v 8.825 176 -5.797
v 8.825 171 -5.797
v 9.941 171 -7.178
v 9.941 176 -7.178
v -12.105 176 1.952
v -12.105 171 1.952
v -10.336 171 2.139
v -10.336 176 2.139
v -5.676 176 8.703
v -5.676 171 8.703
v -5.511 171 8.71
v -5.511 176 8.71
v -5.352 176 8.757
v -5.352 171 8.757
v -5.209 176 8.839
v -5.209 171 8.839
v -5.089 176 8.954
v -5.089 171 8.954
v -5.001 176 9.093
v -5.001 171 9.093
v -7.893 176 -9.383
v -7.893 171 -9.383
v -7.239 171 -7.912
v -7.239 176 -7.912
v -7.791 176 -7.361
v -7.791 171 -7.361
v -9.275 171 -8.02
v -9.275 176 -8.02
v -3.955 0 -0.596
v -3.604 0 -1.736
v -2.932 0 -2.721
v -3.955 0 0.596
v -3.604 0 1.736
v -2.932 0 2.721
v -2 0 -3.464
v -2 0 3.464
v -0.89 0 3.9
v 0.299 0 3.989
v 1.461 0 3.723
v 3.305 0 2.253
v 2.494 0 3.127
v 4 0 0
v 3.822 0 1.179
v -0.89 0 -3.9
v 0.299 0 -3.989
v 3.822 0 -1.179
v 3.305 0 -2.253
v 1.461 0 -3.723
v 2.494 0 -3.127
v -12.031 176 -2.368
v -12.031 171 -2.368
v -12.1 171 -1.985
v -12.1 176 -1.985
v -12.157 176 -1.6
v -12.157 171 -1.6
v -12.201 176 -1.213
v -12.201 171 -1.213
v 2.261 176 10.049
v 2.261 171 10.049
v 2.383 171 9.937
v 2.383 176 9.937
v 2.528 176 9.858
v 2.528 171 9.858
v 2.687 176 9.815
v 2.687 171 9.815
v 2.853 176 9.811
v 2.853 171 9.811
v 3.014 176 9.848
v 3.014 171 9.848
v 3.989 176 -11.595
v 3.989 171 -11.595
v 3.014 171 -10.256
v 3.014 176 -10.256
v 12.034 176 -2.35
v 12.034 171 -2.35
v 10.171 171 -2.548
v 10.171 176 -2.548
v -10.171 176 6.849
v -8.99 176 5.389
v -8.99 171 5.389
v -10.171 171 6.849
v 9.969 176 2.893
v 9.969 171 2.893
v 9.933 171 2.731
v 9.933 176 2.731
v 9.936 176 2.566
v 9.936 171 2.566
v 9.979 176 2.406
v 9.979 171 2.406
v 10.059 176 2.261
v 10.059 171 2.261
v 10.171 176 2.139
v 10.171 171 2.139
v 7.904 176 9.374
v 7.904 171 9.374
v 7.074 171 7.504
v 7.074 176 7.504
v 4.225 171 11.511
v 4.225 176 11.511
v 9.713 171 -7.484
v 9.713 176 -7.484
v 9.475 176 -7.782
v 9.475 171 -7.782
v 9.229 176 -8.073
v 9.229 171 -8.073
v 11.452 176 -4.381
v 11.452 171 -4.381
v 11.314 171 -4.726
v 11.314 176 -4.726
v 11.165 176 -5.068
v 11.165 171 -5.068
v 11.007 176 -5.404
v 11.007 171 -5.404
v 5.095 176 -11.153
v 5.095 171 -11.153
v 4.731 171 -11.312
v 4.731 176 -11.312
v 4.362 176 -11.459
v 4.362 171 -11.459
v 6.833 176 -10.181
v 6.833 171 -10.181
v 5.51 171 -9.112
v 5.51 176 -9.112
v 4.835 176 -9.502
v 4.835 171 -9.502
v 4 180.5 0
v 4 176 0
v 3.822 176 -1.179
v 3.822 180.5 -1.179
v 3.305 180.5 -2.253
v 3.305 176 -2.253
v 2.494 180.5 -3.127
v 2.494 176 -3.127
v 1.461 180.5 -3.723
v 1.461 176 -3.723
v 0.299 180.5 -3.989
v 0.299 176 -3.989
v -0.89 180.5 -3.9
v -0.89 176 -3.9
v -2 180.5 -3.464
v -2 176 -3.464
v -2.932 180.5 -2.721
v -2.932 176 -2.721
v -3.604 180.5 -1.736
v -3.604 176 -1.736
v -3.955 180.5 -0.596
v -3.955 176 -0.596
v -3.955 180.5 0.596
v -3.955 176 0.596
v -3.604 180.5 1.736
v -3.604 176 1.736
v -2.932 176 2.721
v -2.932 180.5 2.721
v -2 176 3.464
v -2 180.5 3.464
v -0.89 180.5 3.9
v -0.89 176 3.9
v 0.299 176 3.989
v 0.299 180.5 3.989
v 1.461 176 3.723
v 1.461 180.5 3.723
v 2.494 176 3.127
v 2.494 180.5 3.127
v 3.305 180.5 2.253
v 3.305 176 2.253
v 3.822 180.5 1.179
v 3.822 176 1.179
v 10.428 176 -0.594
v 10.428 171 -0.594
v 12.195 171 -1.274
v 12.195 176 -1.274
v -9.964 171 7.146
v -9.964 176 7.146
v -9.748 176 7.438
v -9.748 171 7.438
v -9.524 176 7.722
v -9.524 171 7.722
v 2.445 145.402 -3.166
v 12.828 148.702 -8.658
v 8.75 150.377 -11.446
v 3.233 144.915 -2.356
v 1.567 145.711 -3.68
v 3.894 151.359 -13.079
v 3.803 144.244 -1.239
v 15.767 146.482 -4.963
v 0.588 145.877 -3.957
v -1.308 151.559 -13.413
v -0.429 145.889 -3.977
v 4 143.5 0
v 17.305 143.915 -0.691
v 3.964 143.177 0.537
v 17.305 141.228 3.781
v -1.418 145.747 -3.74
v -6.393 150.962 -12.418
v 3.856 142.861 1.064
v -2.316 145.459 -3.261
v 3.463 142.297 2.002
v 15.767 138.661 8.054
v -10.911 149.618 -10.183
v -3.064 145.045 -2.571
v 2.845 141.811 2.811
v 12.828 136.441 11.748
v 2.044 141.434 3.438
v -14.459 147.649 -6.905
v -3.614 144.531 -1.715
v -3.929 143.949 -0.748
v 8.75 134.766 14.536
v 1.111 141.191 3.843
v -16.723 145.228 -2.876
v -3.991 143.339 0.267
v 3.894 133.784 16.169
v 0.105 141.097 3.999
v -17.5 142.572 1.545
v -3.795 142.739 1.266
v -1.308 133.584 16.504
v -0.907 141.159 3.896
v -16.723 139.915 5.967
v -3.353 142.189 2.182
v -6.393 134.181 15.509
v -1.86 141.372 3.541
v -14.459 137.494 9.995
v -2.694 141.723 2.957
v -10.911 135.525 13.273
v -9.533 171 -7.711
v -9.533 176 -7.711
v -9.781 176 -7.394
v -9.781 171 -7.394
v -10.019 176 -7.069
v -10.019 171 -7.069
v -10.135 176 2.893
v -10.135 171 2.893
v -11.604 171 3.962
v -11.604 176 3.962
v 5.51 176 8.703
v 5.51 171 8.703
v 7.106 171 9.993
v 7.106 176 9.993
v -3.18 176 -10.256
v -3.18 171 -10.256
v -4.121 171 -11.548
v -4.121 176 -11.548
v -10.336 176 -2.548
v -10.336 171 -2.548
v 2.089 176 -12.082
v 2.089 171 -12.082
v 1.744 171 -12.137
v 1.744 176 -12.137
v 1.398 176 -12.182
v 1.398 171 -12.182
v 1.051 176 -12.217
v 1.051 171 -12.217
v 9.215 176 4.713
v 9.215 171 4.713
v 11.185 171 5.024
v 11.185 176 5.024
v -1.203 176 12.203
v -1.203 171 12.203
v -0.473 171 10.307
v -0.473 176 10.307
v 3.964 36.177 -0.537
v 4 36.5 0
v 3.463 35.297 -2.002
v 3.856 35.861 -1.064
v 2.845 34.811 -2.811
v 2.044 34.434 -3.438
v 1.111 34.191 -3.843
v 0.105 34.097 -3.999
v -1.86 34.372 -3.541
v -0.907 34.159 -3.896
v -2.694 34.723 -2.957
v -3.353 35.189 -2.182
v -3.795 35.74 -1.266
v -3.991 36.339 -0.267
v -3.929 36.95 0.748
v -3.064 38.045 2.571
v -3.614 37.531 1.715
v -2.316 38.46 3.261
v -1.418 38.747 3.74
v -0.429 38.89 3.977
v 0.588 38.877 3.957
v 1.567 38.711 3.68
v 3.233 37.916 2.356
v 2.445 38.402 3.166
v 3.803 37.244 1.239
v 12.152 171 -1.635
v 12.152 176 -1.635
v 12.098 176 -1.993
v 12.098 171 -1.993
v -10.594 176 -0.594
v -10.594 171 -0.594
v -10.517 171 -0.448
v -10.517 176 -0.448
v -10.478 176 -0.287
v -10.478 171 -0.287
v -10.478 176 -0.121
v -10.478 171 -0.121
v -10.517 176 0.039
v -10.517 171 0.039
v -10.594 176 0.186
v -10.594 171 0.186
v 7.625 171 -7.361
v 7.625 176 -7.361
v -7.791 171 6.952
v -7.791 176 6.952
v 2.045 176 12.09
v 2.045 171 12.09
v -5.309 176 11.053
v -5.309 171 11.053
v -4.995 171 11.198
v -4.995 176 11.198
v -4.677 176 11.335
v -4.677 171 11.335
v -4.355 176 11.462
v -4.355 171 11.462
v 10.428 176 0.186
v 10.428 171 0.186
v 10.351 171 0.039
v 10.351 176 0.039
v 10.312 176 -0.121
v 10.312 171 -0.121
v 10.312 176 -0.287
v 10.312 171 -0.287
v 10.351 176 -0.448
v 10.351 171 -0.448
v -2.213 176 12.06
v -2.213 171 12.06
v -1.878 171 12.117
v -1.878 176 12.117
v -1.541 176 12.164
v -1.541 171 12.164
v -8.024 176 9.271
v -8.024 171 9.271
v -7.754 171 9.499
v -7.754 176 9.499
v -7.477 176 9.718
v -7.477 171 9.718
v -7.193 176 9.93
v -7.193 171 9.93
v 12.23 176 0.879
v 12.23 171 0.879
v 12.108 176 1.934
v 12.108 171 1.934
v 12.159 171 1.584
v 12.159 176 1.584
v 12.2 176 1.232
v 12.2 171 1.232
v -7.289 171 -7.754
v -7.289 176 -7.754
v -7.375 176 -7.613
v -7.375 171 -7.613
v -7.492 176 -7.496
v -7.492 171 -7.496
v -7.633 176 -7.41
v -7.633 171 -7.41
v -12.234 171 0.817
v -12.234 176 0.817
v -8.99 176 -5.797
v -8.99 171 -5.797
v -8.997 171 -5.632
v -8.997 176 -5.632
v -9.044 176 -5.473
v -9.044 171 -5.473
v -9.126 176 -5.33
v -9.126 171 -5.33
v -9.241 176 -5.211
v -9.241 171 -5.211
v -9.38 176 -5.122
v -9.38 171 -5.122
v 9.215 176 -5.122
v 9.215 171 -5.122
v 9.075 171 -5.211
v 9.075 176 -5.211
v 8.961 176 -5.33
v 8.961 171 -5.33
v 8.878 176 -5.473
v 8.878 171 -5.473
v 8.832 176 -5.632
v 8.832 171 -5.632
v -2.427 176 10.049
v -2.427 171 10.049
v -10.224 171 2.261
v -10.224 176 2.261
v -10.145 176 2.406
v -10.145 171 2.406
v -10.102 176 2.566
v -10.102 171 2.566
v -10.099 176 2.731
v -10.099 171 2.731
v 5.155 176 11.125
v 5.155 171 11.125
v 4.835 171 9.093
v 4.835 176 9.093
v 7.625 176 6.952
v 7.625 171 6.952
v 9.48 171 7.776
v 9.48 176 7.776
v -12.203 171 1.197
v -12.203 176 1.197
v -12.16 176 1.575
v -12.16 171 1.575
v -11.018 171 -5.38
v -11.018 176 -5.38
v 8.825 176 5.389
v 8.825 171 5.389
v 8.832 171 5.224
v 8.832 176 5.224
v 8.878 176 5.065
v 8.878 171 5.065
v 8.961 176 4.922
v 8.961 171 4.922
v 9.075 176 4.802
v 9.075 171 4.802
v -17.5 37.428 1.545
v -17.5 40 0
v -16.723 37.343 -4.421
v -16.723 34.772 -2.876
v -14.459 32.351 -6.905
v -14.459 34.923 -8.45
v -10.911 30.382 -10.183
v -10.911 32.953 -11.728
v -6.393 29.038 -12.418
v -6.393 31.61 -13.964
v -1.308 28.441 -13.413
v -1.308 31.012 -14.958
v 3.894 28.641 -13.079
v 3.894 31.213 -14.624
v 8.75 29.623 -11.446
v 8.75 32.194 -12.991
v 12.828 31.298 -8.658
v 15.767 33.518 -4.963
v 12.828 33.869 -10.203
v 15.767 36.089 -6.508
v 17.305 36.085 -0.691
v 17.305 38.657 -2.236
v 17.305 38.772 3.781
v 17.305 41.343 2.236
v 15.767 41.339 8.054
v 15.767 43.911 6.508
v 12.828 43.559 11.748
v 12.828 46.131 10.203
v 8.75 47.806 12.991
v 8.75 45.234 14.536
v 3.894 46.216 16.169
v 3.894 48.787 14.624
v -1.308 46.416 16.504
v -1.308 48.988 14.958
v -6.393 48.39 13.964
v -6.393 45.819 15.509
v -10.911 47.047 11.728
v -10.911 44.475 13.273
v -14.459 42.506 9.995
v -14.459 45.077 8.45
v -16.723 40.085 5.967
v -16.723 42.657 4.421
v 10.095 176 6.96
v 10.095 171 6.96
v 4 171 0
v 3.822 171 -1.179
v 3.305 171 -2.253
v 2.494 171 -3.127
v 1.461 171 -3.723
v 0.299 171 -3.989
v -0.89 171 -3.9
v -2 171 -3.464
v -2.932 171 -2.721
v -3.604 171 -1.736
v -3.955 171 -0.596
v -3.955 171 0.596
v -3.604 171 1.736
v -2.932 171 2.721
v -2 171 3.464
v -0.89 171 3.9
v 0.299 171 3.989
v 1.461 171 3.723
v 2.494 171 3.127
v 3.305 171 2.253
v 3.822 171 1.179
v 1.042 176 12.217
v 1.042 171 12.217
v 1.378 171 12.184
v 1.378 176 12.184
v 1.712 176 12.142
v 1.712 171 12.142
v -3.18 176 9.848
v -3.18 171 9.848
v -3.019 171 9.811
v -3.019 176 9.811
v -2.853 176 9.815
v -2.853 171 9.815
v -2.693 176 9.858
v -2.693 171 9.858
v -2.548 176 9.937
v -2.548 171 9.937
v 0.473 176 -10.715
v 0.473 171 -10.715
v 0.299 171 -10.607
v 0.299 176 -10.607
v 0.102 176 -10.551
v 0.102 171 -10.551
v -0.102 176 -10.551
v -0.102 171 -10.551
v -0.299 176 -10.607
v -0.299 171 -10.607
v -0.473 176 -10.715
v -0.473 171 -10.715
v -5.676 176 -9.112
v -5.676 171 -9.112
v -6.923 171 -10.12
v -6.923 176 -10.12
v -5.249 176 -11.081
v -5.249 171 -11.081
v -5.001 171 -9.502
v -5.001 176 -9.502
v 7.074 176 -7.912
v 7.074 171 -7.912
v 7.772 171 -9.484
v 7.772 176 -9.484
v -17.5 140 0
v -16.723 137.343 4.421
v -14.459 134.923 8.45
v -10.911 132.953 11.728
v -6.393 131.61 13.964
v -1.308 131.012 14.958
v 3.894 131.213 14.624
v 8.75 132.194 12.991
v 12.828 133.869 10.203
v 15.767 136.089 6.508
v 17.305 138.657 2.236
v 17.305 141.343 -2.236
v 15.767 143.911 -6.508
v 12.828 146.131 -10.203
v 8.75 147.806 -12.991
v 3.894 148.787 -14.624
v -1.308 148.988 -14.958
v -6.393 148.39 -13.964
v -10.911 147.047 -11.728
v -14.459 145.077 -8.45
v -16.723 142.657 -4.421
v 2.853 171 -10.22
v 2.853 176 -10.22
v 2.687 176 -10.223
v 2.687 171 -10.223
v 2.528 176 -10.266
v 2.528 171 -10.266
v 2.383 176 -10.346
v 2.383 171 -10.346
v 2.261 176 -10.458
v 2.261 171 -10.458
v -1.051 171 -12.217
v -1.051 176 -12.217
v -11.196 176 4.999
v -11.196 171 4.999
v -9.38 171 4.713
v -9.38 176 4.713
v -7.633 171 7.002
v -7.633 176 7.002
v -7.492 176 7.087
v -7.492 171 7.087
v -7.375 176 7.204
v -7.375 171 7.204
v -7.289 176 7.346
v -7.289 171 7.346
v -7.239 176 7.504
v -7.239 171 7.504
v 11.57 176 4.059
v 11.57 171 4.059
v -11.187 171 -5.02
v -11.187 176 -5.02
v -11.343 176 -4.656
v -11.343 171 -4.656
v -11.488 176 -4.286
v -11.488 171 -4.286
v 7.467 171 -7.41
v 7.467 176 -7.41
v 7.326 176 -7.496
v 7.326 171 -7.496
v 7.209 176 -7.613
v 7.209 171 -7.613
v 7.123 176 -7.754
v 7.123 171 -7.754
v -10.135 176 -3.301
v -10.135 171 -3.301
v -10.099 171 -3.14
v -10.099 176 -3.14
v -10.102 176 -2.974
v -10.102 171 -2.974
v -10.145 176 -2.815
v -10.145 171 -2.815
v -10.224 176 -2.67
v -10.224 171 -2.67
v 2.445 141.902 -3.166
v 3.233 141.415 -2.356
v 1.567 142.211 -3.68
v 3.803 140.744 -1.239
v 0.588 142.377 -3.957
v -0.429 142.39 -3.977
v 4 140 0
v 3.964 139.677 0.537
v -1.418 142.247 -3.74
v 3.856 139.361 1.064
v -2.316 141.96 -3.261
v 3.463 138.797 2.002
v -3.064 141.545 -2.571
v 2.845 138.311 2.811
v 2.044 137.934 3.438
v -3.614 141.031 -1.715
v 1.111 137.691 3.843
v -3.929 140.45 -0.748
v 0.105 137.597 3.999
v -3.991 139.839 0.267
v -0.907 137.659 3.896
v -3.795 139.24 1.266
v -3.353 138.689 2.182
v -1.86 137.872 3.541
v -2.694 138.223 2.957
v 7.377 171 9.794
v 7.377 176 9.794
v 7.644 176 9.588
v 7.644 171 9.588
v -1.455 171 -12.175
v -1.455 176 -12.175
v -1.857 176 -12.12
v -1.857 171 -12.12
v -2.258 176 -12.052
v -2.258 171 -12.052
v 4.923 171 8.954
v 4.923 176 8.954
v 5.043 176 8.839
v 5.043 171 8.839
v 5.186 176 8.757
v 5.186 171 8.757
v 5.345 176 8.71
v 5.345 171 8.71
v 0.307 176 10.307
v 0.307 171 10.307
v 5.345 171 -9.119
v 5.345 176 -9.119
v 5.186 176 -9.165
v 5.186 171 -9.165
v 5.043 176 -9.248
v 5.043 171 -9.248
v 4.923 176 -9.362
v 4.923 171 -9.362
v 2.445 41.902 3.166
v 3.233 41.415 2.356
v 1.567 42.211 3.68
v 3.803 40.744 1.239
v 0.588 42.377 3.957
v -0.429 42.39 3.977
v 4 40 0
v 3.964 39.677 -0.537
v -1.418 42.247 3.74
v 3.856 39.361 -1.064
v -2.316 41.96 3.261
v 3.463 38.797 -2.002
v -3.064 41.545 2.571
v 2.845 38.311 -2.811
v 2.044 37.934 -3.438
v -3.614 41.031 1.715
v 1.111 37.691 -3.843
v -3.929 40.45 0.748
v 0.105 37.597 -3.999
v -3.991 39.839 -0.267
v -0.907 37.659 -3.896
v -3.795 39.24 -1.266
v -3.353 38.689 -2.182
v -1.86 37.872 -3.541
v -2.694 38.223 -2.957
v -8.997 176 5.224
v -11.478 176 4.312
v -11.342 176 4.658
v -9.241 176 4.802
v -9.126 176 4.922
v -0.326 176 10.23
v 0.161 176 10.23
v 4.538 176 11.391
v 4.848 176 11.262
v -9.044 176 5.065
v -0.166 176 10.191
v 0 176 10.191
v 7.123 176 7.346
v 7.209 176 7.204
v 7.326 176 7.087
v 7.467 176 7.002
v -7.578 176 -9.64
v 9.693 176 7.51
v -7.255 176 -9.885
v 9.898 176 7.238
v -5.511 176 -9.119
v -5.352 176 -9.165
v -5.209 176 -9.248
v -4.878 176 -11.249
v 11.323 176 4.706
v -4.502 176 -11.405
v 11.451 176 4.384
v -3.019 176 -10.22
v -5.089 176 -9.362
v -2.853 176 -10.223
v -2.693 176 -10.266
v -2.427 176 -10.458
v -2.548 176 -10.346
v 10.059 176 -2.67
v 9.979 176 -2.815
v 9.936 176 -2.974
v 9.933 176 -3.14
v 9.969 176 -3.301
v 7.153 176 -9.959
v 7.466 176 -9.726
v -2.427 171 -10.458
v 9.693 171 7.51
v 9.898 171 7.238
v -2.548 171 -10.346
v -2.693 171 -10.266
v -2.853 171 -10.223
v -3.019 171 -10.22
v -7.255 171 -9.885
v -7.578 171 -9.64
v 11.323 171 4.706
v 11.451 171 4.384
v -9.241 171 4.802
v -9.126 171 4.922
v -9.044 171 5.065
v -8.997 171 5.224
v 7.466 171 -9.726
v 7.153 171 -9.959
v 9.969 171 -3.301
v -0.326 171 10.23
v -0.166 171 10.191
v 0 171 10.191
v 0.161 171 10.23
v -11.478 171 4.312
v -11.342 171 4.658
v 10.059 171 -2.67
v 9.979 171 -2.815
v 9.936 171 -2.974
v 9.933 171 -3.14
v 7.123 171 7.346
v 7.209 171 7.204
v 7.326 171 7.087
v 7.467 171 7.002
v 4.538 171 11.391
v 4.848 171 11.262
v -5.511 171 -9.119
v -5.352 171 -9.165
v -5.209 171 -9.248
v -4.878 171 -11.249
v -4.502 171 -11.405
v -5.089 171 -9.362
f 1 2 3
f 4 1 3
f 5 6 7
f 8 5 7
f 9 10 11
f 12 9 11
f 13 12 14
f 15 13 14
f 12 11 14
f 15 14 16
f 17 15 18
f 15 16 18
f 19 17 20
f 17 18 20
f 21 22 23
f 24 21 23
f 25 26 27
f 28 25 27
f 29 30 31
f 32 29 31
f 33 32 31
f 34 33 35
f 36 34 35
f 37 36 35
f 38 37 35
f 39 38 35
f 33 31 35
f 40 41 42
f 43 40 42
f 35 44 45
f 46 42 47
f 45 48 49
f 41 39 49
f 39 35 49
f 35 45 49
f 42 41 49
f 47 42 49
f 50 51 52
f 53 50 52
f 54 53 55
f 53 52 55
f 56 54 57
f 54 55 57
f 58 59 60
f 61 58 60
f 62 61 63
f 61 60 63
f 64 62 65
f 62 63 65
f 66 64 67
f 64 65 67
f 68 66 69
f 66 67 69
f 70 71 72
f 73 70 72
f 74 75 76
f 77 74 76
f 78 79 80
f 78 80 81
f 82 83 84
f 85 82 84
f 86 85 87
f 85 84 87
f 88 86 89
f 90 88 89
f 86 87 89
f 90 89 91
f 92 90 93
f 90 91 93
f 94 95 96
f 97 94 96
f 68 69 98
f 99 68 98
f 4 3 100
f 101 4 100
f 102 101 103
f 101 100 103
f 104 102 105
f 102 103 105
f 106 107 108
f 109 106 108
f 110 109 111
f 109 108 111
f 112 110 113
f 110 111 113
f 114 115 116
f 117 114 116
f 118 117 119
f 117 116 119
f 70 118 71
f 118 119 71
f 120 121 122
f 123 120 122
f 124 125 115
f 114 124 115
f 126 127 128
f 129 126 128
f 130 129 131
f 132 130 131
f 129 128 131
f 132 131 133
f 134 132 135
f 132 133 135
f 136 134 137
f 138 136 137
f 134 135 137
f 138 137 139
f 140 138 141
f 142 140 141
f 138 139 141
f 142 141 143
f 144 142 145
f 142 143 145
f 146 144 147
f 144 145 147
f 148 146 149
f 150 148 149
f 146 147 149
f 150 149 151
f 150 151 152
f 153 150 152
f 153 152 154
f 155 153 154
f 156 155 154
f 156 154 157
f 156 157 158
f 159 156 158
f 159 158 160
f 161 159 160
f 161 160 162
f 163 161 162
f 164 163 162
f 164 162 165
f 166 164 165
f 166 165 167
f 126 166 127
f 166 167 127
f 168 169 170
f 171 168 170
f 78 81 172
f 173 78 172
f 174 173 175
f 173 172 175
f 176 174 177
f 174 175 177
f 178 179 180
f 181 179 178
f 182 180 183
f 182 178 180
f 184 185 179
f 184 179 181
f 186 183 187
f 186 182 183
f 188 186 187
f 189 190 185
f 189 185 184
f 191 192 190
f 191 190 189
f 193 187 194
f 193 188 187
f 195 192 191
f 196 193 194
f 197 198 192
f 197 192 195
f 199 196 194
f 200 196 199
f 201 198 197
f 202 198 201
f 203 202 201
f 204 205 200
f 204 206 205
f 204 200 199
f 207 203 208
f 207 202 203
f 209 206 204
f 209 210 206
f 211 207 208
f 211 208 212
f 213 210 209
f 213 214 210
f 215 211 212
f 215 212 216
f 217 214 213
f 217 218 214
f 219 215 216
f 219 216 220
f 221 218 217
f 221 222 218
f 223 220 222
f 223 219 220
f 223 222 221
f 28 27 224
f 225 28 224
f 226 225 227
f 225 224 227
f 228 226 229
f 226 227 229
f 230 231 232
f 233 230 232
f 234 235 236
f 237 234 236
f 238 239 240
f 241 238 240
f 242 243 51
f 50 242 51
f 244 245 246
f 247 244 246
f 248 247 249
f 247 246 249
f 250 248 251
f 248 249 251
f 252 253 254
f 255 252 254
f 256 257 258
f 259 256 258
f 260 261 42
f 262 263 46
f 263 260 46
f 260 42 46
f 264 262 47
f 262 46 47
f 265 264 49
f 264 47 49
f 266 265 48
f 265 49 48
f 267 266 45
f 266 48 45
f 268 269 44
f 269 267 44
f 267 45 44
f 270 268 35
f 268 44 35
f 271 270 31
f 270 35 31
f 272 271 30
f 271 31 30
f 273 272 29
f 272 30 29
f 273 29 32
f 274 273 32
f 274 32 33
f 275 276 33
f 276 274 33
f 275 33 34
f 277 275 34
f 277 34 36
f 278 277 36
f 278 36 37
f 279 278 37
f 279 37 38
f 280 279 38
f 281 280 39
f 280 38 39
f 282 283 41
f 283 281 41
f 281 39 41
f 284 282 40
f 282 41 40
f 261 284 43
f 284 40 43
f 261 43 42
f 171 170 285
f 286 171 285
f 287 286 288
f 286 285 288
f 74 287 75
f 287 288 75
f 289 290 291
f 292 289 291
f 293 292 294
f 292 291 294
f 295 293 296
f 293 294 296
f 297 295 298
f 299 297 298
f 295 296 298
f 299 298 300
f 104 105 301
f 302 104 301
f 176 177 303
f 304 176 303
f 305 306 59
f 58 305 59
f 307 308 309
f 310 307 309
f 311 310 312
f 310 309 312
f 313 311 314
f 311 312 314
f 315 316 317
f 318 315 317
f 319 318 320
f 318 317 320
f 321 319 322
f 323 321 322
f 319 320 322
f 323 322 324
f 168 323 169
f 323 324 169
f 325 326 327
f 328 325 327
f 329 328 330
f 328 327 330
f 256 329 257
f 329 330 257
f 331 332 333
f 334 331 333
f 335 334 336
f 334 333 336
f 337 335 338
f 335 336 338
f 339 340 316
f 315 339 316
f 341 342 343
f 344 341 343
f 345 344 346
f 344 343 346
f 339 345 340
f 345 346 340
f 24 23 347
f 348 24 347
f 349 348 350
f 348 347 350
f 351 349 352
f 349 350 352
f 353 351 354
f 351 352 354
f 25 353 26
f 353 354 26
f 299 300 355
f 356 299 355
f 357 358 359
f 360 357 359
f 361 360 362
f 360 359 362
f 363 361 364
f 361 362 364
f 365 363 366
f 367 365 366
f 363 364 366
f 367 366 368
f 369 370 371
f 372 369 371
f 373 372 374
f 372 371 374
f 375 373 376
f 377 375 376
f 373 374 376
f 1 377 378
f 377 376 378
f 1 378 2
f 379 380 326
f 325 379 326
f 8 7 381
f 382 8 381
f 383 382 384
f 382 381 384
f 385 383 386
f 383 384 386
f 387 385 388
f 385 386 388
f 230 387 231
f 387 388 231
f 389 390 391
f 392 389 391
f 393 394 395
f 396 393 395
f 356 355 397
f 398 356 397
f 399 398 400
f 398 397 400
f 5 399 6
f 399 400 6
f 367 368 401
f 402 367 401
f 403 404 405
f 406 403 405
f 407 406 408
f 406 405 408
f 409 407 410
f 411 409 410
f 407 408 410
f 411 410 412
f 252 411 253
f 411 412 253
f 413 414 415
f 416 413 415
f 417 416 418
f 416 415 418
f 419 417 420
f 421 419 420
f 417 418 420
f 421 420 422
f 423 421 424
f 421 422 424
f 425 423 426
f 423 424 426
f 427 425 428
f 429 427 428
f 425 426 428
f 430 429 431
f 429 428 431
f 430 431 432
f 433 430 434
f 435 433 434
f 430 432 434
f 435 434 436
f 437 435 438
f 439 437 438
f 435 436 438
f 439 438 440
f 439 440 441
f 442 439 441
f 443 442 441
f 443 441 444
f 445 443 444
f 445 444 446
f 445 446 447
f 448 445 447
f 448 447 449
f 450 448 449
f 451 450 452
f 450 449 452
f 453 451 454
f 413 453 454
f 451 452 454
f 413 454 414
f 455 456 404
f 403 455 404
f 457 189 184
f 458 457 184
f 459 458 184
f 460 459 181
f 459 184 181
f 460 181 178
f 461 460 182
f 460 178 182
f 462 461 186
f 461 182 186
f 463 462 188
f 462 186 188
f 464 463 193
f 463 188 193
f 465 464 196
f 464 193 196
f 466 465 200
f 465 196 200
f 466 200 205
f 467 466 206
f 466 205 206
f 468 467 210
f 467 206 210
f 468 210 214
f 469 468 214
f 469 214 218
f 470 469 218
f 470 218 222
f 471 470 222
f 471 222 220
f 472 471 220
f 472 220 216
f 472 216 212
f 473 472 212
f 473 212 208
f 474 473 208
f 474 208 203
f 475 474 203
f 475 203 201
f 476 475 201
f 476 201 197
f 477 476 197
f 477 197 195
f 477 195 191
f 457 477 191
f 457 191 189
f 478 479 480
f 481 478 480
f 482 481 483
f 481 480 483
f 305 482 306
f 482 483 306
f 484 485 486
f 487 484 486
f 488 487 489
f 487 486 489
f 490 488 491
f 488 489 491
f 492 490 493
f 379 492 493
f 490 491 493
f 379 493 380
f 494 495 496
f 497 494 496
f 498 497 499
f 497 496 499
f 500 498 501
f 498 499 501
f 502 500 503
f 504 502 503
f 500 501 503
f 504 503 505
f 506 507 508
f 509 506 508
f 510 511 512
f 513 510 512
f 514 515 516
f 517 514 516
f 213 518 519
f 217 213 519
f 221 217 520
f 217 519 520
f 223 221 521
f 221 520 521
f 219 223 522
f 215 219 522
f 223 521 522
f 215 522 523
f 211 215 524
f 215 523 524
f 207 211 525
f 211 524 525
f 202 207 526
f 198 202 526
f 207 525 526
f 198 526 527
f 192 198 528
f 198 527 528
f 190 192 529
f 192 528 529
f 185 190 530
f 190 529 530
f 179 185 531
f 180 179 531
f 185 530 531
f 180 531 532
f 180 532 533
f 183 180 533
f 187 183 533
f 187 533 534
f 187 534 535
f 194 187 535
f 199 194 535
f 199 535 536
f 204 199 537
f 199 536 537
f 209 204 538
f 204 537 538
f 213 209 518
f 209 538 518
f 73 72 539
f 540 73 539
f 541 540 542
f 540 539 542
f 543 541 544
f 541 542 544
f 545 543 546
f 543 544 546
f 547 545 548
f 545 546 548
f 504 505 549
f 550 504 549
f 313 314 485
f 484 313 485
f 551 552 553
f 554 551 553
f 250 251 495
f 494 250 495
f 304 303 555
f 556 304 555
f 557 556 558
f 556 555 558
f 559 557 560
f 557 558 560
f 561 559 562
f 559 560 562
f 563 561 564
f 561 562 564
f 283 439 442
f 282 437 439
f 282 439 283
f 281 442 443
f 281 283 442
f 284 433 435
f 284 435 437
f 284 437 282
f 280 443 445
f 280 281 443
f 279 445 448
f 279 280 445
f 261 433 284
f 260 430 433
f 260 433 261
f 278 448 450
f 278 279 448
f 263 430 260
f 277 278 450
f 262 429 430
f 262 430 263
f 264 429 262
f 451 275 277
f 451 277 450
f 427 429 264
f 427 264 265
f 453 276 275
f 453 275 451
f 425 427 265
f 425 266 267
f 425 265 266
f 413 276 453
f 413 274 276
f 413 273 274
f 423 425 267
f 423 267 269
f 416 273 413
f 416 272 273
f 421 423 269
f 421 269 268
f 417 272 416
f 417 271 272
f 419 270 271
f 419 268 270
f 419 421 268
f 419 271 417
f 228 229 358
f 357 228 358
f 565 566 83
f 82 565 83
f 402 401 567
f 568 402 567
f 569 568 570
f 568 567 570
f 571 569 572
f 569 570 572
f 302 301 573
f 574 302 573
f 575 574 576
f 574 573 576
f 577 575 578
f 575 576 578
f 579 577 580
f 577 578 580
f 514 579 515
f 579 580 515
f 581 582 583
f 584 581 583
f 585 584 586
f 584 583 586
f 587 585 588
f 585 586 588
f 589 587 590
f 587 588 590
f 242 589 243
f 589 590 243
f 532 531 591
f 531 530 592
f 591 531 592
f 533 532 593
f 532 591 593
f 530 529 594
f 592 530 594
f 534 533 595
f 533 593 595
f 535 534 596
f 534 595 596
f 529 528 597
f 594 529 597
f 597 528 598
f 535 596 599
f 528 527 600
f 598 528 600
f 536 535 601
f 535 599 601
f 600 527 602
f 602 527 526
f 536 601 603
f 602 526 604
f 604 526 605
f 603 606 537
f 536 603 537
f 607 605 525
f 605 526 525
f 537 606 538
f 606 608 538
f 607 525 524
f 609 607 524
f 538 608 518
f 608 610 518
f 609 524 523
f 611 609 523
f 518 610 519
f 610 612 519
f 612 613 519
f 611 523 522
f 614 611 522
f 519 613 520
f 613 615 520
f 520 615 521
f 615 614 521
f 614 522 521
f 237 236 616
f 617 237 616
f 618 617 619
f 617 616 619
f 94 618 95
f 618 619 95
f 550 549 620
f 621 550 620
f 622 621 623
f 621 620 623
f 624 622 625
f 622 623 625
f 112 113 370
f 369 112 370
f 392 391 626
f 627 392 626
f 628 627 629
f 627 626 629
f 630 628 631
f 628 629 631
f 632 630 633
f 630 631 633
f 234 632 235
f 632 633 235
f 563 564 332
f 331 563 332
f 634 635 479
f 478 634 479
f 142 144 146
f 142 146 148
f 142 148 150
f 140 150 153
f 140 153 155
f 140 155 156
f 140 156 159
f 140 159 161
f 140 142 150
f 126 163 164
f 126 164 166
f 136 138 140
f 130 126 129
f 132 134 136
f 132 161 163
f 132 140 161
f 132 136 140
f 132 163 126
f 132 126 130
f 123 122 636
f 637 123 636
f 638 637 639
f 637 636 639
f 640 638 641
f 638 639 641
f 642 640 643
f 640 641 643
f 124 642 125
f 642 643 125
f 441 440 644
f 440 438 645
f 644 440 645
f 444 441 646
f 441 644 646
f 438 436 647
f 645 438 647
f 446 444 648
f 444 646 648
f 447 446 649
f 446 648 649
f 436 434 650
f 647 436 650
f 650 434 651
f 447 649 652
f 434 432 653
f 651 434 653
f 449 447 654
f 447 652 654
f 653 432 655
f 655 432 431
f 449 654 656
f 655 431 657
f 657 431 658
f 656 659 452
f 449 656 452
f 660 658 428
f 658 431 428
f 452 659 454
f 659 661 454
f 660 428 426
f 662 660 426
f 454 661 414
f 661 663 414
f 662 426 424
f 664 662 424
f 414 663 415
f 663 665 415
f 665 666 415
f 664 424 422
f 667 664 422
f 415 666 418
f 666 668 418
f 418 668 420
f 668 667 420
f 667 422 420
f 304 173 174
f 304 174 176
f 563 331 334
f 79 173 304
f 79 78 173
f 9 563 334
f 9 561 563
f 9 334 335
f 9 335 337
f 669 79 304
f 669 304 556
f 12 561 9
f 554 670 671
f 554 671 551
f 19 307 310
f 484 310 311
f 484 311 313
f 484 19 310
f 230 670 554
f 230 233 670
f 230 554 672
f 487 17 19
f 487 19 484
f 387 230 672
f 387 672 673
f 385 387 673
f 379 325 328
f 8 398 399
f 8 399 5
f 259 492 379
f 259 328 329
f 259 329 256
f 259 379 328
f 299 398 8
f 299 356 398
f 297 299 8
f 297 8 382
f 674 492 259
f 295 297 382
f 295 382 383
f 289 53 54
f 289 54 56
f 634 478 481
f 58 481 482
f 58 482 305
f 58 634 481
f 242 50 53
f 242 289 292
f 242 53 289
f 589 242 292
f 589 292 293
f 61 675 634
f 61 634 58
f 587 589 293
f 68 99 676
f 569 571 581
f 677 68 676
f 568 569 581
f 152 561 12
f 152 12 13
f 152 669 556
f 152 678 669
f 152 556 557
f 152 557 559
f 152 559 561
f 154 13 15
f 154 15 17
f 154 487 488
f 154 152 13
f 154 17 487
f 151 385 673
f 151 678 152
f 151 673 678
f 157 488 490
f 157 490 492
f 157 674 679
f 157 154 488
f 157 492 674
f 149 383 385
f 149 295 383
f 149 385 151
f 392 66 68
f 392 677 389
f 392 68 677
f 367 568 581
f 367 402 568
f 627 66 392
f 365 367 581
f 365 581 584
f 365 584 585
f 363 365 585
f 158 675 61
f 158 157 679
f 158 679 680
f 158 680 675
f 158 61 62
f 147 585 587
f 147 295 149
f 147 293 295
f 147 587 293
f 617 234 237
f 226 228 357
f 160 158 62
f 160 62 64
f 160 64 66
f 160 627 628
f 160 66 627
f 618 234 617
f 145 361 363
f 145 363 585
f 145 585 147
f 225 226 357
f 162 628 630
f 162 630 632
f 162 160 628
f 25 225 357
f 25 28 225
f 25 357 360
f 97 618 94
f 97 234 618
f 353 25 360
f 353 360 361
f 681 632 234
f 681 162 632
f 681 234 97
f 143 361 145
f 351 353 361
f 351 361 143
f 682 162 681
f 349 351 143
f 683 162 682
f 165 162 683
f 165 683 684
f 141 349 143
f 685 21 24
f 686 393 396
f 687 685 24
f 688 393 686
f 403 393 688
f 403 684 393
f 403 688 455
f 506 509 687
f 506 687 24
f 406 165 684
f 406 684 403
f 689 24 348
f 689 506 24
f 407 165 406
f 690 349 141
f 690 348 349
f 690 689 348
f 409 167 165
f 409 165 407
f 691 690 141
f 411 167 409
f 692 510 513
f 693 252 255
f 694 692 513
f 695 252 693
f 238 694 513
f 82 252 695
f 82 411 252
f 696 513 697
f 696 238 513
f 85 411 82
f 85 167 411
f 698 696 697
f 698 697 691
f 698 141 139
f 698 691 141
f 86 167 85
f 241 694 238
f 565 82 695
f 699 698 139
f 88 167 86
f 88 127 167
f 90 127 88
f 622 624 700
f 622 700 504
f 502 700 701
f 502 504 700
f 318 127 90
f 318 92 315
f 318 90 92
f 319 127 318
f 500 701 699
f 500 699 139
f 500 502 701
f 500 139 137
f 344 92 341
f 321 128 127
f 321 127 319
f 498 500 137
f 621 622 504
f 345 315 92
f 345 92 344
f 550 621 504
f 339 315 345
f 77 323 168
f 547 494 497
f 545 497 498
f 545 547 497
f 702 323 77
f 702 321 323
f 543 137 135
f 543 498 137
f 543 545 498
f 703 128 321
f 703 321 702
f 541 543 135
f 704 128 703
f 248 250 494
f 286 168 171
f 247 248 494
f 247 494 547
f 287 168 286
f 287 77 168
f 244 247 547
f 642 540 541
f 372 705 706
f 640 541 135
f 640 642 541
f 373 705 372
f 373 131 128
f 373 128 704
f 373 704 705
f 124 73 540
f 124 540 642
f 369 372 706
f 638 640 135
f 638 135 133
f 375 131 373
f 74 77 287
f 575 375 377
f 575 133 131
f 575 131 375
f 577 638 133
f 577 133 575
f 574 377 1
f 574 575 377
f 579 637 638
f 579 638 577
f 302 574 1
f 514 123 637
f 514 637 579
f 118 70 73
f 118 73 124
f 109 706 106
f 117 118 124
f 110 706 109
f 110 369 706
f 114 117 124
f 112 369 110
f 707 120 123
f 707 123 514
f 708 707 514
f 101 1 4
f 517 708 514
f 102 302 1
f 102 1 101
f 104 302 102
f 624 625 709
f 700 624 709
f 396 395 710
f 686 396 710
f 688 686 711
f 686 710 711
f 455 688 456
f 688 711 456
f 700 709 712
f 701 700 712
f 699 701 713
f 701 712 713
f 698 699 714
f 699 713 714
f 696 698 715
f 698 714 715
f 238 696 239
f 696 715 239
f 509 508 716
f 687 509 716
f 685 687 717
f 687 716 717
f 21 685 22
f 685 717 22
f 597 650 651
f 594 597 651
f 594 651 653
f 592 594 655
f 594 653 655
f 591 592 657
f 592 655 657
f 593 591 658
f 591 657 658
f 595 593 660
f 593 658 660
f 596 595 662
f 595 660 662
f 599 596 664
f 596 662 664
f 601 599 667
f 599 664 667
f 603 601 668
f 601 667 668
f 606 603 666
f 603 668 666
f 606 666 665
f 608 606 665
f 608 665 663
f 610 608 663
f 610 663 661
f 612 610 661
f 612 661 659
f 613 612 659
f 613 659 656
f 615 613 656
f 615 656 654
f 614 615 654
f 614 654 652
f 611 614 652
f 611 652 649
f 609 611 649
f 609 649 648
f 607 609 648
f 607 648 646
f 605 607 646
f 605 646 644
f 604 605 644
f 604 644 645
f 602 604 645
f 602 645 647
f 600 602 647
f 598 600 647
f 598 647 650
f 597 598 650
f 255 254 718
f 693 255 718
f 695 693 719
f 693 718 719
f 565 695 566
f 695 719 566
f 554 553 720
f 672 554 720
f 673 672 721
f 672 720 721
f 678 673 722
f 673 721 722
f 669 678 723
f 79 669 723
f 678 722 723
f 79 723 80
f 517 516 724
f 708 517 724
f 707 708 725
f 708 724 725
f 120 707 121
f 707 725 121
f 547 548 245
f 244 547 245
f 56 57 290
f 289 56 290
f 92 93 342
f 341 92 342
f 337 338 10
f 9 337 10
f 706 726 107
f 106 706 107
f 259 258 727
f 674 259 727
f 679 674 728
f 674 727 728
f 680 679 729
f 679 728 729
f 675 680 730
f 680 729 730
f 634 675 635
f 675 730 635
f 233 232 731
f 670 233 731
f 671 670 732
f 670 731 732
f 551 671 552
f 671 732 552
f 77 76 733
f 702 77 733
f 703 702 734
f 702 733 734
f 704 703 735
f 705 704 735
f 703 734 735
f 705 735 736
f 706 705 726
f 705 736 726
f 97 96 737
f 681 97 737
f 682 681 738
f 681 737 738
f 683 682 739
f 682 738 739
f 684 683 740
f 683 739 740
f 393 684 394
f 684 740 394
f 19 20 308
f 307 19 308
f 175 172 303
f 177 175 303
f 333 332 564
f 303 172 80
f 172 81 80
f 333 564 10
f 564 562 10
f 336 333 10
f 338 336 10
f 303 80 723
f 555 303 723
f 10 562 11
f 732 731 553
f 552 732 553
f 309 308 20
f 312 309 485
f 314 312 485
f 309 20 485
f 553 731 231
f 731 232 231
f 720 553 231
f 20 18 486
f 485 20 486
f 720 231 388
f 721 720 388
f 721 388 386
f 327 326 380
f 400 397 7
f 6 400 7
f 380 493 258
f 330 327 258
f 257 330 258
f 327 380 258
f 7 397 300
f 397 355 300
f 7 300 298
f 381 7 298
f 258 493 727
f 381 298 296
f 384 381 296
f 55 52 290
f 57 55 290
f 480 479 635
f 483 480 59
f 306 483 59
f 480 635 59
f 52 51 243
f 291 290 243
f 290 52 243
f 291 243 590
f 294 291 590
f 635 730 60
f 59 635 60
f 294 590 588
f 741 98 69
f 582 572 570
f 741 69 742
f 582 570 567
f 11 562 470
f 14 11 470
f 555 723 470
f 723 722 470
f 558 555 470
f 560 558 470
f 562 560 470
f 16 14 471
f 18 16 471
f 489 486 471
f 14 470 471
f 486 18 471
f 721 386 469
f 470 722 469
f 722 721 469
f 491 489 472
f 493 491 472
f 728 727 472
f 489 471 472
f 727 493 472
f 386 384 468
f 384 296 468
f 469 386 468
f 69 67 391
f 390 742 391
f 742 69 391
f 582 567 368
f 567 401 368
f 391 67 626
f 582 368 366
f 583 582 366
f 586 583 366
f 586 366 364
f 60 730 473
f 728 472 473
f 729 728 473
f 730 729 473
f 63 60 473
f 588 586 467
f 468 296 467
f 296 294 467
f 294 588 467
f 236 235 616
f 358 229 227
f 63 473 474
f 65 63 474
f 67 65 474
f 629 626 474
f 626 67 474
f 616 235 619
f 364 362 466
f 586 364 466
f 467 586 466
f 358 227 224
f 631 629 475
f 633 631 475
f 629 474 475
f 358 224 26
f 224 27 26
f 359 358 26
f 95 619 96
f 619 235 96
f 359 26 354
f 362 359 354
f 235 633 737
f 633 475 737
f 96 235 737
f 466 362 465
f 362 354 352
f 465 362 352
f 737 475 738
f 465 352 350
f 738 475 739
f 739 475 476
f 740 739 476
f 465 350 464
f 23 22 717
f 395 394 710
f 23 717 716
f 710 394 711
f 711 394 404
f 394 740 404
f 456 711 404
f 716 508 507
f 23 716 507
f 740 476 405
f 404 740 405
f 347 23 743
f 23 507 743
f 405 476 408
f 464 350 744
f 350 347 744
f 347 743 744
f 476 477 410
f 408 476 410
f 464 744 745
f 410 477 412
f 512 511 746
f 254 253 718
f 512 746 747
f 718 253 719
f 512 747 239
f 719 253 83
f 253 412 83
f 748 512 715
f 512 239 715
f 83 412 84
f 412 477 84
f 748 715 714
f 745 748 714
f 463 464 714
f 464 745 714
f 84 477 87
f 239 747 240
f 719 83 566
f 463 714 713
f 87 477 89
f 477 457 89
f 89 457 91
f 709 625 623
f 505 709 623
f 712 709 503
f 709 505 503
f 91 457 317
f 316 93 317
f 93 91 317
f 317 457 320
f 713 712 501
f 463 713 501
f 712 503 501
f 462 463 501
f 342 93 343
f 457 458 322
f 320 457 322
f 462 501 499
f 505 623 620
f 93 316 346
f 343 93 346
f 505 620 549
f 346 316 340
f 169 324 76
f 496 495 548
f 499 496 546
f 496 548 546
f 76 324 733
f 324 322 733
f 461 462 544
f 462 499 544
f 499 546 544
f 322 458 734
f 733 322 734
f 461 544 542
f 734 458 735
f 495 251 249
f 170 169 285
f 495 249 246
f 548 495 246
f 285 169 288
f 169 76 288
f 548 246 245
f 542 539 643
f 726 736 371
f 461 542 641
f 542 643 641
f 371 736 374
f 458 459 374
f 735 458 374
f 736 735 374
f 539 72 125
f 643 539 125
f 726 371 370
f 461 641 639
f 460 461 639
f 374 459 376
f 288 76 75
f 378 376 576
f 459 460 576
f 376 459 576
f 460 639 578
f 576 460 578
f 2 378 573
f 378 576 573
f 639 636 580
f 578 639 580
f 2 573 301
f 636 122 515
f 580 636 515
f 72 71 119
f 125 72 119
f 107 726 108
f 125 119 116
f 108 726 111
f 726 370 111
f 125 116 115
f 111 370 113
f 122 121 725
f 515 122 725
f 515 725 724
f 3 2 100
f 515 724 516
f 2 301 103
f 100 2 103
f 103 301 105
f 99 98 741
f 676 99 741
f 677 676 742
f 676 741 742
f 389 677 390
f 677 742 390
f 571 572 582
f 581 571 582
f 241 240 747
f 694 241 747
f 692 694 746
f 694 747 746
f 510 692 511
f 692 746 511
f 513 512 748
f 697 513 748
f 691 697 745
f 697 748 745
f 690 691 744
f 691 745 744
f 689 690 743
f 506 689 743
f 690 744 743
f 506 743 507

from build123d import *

# Parameters (mm, degrees)
CROQUIS1_R              = 4
SALIENTE_EXTRUIR1_DEPTH = 171
CROQUIS2_R              = 17.5
SALIENTE_EXTRUIR2_DEPTH = 3
SALIENTE_EXTRUIR3_DEPTH = 5
CROQUIS4_R              = 4
SALIENTE_EXTRUIR4_DEPTH = 4.5
CROQUIS8_R              = 17.5
SALIENTE_EXTRUIR6_DEPTH = 3


with BuildPart() as part:
    # Croquis1 → Saliente-Extruir1 (new body)
    with BuildSketch(Plane(origin=(0, 0, 0), x_dir=(1, 0, 0), z_dir=(0, 1, 0))):
        Circle(CROQUIS1_R)
    extrude(amount=SALIENTE_EXTRUIR1_DEPTH)

    # Croquis2 → Saliente-Extruir2 (add)
    with BuildSketch(Plane(origin=(0, 29.389431256, -17.658951857), x_dir=(-1, 0, 0), z_dir=(0, -0.857167301, 0.515038075))):
        with Locations((0, -20.601522996)):
            Circle(CROQUIS2_R)
    extrude(amount=SALIENTE_EXTRUIR2_DEPTH)

    # Croquis3 → Saliente-Extruir3 (add)
    with BuildSketch(Plane(origin=(0, 171, 0), x_dir=(1, 0, 0), z_dir=(0, 1, 0))):
        with BuildLine():
            Line((1.050742858, 12.216507919), (0.472845286, 10.71499343))
            ThreePointArc((0.472845286, 10.71499343), (0, 10.543875222), (-0.472845286, 10.71499343))
            Line((-0.472845286, 10.71499343), (-1.050742858, 12.216507919))
            ThreePointArc((-1.050742858, 12.216507919), (-1.656207782, 12.14924286), (-2.257584572, 12.051988972))
            Line((-2.257584572, 12.051988972), (-2.426564451, 10.457781423))
            ThreePointArc((-2.426564451, 10.457781423), (-2.771930057, 10.239934406), (-3.179948954, 10.255912654))
            Line((-3.179948954, 10.255912654), (-4.120766374, 11.54843759))
            ThreePointArc((-4.120766374, 11.54843759), (-4.690827714, 11.328868507), (-5.249245828, 11.081179745))
            Line((-5.249245828, 11.081179745), (-5.000525386, 9.501805204))
            ThreePointArc((-5.000525386, 9.501805204), (-5.277739988, 9.201993948), (-5.675991453, 9.111824689))
            Line((-5.675991453, 9.111824689), (-6.923284582, 10.120042336))
            ThreePointArc((-6.923284582, 10.120042336), (-7.417219229, 9.763809974), (-7.892857245, 9.383492462))
            Line((-7.892857245, 9.383492462), (-7.239355878, 7.912212973))
            ThreePointArc((-7.239355878, 7.912212973), (-7.429527758, 7.55086912), (-7.790871612, 7.360697239))
            Line((-7.790871612, 7.360697239), (-9.275101788, 8.019950942))
            ThreePointArc((-9.275101788, 8.019950942), (-9.658562641, 7.553760256), (-10.018615343, 7.069262543))
            Line((-10.018615343, 7.069262543), (-8.990483327, 5.797332815))
            ThreePointArc((-8.990483327, 5.797332815), (-9.080652586, 5.39908135), (-9.380463842, 5.121866748))
            Line((-9.380463842, 5.121866748), (-11.018384727, 5.379807088))
            ThreePointArc((-11.018384727, 5.379807088), (-11.266454067, 4.838815873), (-11.487980236, 4.286424664))
            Line((-11.487980236, 4.286424664), (-10.134571292, 3.301290316))
            ThreePointArc((-10.134571292, 3.301290316), (-10.118593045, 2.893271419), (-10.336440061, 2.547905812))
            Line((-10.336440061, 2.547905812), (-12.0307187, 2.368318783))
            ThreePointArc((-12.0307187, 2.368318783), (-12.129855039, 1.792691558), (-12.201465745, 1.212996274))
            Line((-12.201465745, 1.212996274), (-10.593652069, 0.594186647))
            ThreePointArc((-10.593652069, 0.594186647), (-10.472615206, 0.204206132), (-10.593652069, -0.185774383))
            Line((-10.593652069, -0.185774383), (-12.234346993, -0.817239228))
            ThreePointArc((-12.234346993, -0.817239228), (-12.183011813, -1.386127504), (-12.105238209, -1.952007737))
            Line((-12.105238209, -1.952007737), (-10.336440061, -2.139493548))
            ThreePointArc((-10.336440061, -2.139493548), (-10.118593045, -2.484859155), (-10.134571292, -2.892878051))
            Line((-10.134571292, -2.892878051), (-11.603765461, -3.962291436))
            ThreePointArc((-11.603765461, -3.962291436), (-11.411733847, -4.485471759), (-11.196127365, -4.999385795))
            Line((-11.196127365, -4.999385795), (-9.380463842, -4.713454484))
            ThreePointArc((-9.380463842, -4.713454484), (-9.080652586, -4.990669086), (-8.990483327, -5.388920551))
            Line((-8.990483327, -5.388920551), (-10.170571543, -6.848839375))
            ThreePointArc((-10.170571543, -6.848839375), (-9.857154436, -7.29271093), (-9.524379813, -7.722261033))
            Line((-9.524379813, -7.722261033), (-7.790871612, -6.952284975))
            ThreePointArc((-7.790871612, -6.952284975), (-7.429527758, -7.142456856), (-7.239355878, -7.503800709))
            Line((-7.239355878, -7.503800709), (-8.024406446, -9.271247353))
            ThreePointArc((-8.024406446, -9.271247353), (-7.61599094, -9.60956858), (-7.193327687, -9.929912542))
            Line((-7.193327687, -9.929912542), (-5.675991453, -8.703412424))
            ThreePointArc((-5.675991453, -8.703412424), (-5.277739988, -8.793581684), (-5.000525386, -9.09339294))
            Line((-5.000525386, -9.09339294), (-5.309068741, -11.052642915))
            ThreePointArc((-5.309068741, -11.052642915), (-4.836465093, -11.26746341), (-4.355191926, -11.462086615))
            Line((-4.355191926, -11.462086615), (-3.179948954, -9.84750039))
            ThreePointArc((-3.179948954, -9.84750039), (-2.771930057, -9.831522142), (-2.426564451, -10.049369159))
            Line((-2.426564451, -10.049369159), (-2.213426541, -12.060176999))
            ThreePointArc((-2.213426541, -12.060176999), (-1.70946512, -12.141863749), (-1.202540078, -12.202500713))
            Line((-1.202540078, -12.202500713), (-0.472845286, -10.306581166))
            ThreePointArc((-0.472845286, -10.306581166), (-0.08286477, -10.185544303), (0.307115745, -10.306581166))
            Line((0.307115745, -10.306581166), (1.042474215, -12.217216287))
            ThreePointArc((1.042474215, -12.217216287), (1.544818551, -12.163908169), (2.04454079, -12.08995365))
            Line((2.04454079, -12.08995365), (2.26083491, -10.049369159))
            ThreePointArc((2.26083491, -10.049369159), (2.606200516, -9.831522142), (3.014219413, -9.84750039))
            Line((3.014219413, -9.84750039), (4.224886916, -11.510753965))
            ThreePointArc((4.224886916, -11.510753965), (4.693799885, -11.327637394), (5.154801423, -11.125428018))
            Line((5.154801423, -11.125428018), (4.834795845, -9.09339294))
            ThreePointArc((4.834795845, -9.09339294), (5.112010447, -8.793581684), (5.510261912, -8.703412424))
            Line((5.510261912, -8.703412424), (7.105542644, -9.992916993))
            ThreePointArc((7.105542644, -9.992916993), (7.511283882, -9.691632511), (7.90426552, -9.37388462))
            Line((7.90426552, -9.37388462), (7.073626337, -7.503800709))
            ThreePointArc((7.073626337, -7.503800709), (7.263798217, -7.142456856), (7.625142071, -6.952284975))
            Line((7.625142071, -6.952284975), (9.480310931, -7.776299309))
            ThreePointArc((9.480310931, -7.776299309), (9.796043302, -7.374595712), (10.094766478, -6.960087359))
            Line((10.094766478, -6.960087359), (8.824753786, -5.388920551))
            ThreePointArc((8.824753786, -5.388920551), (8.914923046, -4.990669086), (9.214734302, -4.713454484))
            Line((9.214734302, -4.713454484), (11.185209251, -5.023765551))
            ThreePointArc((11.185209251, -5.023765551), (11.388040568, -4.545289685), (11.570414703, -4.058648777))
            Line((11.570414703, -4.058648777), (9.968841751, -2.892878051))
            ThreePointArc((9.968841751, -2.892878051), (9.952863504, -2.484859155), (10.17071052, -2.139493548))
            Line((10.17071052, -2.139493548), (12.108106386, -1.934137026))
            ThreePointArc((12.108106386, -1.934137026), (12.180495026, -1.408072161), (12.230038474, -0.879366378))
            Line((12.230038474, -0.879366378), (10.427922528, -0.185774383))
            ThreePointArc((10.427922528, -0.185774383), (10.306885665, 0.204206132), (10.427922528, 0.594186647))
            Line((10.427922528, 0.594186647), (12.195208041, 1.274373229))
            ThreePointArc((12.195208041, 1.274373229), (12.12666239, 1.8141625), (12.034236318, 2.350379234))
            Line((12.034236318, 2.350379234), (10.17071052, 2.547905812))
            ThreePointArc((10.17071052, 2.547905812), (9.952863504, 2.893271419), (9.968841751, 3.301290316))
            Line((9.968841751, 3.301290316), (11.452232826, 4.381037502))
            ThreePointArc((11.452232826, 4.381037502), (11.241020253, 4.897610638), (11.006520824, 5.404037901))
            Line((11.006520824, 5.404037901), (9.214734302, 5.121866748))
            ThreePointArc((9.214734302, 5.121866748), (8.914923046, 5.39908135), (8.824753786, 5.797332815))
            Line((8.824753786, 5.797332815), (9.940895623, 7.178141856))
            ThreePointArc((9.940895623, 7.178141856), (9.595346713, 7.633901214), (9.228920544, 8.073050965))
            Line((9.228920544, 8.073050965), (7.625142071, 7.360697239))
            ThreePointArc((7.625142071, 7.360697239), (7.263798217, 7.55086912), (7.073626337, 7.912212973))
            Line((7.073626337, 7.912212973), (7.77177818, 9.48401762))
            ThreePointArc((7.77177818, 9.48401762), (7.310768329, 9.843769234), (6.83313078, 10.181132061))
            Line((6.83313078, 10.181132061), (5.510261912, 9.111824689))
            ThreePointArc((5.510261912, 9.111824689), (5.112010447, 9.201993948), (4.834795845, 9.501805204))
            Line((4.834795845, 9.501805204), (5.094829592, 11.15301922))
            ThreePointArc((5.094829592, 11.15301922), (4.547139411, 11.387302116), (3.988716959, 11.594708419))
            Line((3.988716959, 11.594708419), (3.014219413, 10.255912654))
            ThreePointArc((3.014219413, 10.255912654), (2.606200516, 10.239934406), (2.26083491, 10.457781423))
            Line((2.26083491, 10.457781423), (2.088629995, 12.082414951))
            ThreePointArc((2.088629995, 12.082414951), (1.571117662, 12.16053928), (1.050742858, 12.216507919))
        make_face()
    extrude(amount=SALIENTE_EXTRUIR3_DEPTH)

    # Croquis4 → Saliente-Extruir4 (add)
    with BuildSketch(Plane(origin=(0, 176, 0), x_dir=(1, 0, 0), z_dir=(0, 1, 0))):
        Circle(CROQUIS4_R)
    extrude(amount=SALIENTE_EXTRUIR4_DEPTH)

    # Croquis8 → Saliente-Extruir6 (add)
    with BuildSketch(Plane(origin=(0, 102.863009395, 61.8063315), x_dir=(-1, 0, 0), z_dir=(0, 0.857167301, 0.515038075))):
        with Locations((0, -72.105330487)):
            Circle(CROQUIS8_R)
    extrude(amount=SALIENTE_EXTRUIR6_DEPTH)


solid = part.part
